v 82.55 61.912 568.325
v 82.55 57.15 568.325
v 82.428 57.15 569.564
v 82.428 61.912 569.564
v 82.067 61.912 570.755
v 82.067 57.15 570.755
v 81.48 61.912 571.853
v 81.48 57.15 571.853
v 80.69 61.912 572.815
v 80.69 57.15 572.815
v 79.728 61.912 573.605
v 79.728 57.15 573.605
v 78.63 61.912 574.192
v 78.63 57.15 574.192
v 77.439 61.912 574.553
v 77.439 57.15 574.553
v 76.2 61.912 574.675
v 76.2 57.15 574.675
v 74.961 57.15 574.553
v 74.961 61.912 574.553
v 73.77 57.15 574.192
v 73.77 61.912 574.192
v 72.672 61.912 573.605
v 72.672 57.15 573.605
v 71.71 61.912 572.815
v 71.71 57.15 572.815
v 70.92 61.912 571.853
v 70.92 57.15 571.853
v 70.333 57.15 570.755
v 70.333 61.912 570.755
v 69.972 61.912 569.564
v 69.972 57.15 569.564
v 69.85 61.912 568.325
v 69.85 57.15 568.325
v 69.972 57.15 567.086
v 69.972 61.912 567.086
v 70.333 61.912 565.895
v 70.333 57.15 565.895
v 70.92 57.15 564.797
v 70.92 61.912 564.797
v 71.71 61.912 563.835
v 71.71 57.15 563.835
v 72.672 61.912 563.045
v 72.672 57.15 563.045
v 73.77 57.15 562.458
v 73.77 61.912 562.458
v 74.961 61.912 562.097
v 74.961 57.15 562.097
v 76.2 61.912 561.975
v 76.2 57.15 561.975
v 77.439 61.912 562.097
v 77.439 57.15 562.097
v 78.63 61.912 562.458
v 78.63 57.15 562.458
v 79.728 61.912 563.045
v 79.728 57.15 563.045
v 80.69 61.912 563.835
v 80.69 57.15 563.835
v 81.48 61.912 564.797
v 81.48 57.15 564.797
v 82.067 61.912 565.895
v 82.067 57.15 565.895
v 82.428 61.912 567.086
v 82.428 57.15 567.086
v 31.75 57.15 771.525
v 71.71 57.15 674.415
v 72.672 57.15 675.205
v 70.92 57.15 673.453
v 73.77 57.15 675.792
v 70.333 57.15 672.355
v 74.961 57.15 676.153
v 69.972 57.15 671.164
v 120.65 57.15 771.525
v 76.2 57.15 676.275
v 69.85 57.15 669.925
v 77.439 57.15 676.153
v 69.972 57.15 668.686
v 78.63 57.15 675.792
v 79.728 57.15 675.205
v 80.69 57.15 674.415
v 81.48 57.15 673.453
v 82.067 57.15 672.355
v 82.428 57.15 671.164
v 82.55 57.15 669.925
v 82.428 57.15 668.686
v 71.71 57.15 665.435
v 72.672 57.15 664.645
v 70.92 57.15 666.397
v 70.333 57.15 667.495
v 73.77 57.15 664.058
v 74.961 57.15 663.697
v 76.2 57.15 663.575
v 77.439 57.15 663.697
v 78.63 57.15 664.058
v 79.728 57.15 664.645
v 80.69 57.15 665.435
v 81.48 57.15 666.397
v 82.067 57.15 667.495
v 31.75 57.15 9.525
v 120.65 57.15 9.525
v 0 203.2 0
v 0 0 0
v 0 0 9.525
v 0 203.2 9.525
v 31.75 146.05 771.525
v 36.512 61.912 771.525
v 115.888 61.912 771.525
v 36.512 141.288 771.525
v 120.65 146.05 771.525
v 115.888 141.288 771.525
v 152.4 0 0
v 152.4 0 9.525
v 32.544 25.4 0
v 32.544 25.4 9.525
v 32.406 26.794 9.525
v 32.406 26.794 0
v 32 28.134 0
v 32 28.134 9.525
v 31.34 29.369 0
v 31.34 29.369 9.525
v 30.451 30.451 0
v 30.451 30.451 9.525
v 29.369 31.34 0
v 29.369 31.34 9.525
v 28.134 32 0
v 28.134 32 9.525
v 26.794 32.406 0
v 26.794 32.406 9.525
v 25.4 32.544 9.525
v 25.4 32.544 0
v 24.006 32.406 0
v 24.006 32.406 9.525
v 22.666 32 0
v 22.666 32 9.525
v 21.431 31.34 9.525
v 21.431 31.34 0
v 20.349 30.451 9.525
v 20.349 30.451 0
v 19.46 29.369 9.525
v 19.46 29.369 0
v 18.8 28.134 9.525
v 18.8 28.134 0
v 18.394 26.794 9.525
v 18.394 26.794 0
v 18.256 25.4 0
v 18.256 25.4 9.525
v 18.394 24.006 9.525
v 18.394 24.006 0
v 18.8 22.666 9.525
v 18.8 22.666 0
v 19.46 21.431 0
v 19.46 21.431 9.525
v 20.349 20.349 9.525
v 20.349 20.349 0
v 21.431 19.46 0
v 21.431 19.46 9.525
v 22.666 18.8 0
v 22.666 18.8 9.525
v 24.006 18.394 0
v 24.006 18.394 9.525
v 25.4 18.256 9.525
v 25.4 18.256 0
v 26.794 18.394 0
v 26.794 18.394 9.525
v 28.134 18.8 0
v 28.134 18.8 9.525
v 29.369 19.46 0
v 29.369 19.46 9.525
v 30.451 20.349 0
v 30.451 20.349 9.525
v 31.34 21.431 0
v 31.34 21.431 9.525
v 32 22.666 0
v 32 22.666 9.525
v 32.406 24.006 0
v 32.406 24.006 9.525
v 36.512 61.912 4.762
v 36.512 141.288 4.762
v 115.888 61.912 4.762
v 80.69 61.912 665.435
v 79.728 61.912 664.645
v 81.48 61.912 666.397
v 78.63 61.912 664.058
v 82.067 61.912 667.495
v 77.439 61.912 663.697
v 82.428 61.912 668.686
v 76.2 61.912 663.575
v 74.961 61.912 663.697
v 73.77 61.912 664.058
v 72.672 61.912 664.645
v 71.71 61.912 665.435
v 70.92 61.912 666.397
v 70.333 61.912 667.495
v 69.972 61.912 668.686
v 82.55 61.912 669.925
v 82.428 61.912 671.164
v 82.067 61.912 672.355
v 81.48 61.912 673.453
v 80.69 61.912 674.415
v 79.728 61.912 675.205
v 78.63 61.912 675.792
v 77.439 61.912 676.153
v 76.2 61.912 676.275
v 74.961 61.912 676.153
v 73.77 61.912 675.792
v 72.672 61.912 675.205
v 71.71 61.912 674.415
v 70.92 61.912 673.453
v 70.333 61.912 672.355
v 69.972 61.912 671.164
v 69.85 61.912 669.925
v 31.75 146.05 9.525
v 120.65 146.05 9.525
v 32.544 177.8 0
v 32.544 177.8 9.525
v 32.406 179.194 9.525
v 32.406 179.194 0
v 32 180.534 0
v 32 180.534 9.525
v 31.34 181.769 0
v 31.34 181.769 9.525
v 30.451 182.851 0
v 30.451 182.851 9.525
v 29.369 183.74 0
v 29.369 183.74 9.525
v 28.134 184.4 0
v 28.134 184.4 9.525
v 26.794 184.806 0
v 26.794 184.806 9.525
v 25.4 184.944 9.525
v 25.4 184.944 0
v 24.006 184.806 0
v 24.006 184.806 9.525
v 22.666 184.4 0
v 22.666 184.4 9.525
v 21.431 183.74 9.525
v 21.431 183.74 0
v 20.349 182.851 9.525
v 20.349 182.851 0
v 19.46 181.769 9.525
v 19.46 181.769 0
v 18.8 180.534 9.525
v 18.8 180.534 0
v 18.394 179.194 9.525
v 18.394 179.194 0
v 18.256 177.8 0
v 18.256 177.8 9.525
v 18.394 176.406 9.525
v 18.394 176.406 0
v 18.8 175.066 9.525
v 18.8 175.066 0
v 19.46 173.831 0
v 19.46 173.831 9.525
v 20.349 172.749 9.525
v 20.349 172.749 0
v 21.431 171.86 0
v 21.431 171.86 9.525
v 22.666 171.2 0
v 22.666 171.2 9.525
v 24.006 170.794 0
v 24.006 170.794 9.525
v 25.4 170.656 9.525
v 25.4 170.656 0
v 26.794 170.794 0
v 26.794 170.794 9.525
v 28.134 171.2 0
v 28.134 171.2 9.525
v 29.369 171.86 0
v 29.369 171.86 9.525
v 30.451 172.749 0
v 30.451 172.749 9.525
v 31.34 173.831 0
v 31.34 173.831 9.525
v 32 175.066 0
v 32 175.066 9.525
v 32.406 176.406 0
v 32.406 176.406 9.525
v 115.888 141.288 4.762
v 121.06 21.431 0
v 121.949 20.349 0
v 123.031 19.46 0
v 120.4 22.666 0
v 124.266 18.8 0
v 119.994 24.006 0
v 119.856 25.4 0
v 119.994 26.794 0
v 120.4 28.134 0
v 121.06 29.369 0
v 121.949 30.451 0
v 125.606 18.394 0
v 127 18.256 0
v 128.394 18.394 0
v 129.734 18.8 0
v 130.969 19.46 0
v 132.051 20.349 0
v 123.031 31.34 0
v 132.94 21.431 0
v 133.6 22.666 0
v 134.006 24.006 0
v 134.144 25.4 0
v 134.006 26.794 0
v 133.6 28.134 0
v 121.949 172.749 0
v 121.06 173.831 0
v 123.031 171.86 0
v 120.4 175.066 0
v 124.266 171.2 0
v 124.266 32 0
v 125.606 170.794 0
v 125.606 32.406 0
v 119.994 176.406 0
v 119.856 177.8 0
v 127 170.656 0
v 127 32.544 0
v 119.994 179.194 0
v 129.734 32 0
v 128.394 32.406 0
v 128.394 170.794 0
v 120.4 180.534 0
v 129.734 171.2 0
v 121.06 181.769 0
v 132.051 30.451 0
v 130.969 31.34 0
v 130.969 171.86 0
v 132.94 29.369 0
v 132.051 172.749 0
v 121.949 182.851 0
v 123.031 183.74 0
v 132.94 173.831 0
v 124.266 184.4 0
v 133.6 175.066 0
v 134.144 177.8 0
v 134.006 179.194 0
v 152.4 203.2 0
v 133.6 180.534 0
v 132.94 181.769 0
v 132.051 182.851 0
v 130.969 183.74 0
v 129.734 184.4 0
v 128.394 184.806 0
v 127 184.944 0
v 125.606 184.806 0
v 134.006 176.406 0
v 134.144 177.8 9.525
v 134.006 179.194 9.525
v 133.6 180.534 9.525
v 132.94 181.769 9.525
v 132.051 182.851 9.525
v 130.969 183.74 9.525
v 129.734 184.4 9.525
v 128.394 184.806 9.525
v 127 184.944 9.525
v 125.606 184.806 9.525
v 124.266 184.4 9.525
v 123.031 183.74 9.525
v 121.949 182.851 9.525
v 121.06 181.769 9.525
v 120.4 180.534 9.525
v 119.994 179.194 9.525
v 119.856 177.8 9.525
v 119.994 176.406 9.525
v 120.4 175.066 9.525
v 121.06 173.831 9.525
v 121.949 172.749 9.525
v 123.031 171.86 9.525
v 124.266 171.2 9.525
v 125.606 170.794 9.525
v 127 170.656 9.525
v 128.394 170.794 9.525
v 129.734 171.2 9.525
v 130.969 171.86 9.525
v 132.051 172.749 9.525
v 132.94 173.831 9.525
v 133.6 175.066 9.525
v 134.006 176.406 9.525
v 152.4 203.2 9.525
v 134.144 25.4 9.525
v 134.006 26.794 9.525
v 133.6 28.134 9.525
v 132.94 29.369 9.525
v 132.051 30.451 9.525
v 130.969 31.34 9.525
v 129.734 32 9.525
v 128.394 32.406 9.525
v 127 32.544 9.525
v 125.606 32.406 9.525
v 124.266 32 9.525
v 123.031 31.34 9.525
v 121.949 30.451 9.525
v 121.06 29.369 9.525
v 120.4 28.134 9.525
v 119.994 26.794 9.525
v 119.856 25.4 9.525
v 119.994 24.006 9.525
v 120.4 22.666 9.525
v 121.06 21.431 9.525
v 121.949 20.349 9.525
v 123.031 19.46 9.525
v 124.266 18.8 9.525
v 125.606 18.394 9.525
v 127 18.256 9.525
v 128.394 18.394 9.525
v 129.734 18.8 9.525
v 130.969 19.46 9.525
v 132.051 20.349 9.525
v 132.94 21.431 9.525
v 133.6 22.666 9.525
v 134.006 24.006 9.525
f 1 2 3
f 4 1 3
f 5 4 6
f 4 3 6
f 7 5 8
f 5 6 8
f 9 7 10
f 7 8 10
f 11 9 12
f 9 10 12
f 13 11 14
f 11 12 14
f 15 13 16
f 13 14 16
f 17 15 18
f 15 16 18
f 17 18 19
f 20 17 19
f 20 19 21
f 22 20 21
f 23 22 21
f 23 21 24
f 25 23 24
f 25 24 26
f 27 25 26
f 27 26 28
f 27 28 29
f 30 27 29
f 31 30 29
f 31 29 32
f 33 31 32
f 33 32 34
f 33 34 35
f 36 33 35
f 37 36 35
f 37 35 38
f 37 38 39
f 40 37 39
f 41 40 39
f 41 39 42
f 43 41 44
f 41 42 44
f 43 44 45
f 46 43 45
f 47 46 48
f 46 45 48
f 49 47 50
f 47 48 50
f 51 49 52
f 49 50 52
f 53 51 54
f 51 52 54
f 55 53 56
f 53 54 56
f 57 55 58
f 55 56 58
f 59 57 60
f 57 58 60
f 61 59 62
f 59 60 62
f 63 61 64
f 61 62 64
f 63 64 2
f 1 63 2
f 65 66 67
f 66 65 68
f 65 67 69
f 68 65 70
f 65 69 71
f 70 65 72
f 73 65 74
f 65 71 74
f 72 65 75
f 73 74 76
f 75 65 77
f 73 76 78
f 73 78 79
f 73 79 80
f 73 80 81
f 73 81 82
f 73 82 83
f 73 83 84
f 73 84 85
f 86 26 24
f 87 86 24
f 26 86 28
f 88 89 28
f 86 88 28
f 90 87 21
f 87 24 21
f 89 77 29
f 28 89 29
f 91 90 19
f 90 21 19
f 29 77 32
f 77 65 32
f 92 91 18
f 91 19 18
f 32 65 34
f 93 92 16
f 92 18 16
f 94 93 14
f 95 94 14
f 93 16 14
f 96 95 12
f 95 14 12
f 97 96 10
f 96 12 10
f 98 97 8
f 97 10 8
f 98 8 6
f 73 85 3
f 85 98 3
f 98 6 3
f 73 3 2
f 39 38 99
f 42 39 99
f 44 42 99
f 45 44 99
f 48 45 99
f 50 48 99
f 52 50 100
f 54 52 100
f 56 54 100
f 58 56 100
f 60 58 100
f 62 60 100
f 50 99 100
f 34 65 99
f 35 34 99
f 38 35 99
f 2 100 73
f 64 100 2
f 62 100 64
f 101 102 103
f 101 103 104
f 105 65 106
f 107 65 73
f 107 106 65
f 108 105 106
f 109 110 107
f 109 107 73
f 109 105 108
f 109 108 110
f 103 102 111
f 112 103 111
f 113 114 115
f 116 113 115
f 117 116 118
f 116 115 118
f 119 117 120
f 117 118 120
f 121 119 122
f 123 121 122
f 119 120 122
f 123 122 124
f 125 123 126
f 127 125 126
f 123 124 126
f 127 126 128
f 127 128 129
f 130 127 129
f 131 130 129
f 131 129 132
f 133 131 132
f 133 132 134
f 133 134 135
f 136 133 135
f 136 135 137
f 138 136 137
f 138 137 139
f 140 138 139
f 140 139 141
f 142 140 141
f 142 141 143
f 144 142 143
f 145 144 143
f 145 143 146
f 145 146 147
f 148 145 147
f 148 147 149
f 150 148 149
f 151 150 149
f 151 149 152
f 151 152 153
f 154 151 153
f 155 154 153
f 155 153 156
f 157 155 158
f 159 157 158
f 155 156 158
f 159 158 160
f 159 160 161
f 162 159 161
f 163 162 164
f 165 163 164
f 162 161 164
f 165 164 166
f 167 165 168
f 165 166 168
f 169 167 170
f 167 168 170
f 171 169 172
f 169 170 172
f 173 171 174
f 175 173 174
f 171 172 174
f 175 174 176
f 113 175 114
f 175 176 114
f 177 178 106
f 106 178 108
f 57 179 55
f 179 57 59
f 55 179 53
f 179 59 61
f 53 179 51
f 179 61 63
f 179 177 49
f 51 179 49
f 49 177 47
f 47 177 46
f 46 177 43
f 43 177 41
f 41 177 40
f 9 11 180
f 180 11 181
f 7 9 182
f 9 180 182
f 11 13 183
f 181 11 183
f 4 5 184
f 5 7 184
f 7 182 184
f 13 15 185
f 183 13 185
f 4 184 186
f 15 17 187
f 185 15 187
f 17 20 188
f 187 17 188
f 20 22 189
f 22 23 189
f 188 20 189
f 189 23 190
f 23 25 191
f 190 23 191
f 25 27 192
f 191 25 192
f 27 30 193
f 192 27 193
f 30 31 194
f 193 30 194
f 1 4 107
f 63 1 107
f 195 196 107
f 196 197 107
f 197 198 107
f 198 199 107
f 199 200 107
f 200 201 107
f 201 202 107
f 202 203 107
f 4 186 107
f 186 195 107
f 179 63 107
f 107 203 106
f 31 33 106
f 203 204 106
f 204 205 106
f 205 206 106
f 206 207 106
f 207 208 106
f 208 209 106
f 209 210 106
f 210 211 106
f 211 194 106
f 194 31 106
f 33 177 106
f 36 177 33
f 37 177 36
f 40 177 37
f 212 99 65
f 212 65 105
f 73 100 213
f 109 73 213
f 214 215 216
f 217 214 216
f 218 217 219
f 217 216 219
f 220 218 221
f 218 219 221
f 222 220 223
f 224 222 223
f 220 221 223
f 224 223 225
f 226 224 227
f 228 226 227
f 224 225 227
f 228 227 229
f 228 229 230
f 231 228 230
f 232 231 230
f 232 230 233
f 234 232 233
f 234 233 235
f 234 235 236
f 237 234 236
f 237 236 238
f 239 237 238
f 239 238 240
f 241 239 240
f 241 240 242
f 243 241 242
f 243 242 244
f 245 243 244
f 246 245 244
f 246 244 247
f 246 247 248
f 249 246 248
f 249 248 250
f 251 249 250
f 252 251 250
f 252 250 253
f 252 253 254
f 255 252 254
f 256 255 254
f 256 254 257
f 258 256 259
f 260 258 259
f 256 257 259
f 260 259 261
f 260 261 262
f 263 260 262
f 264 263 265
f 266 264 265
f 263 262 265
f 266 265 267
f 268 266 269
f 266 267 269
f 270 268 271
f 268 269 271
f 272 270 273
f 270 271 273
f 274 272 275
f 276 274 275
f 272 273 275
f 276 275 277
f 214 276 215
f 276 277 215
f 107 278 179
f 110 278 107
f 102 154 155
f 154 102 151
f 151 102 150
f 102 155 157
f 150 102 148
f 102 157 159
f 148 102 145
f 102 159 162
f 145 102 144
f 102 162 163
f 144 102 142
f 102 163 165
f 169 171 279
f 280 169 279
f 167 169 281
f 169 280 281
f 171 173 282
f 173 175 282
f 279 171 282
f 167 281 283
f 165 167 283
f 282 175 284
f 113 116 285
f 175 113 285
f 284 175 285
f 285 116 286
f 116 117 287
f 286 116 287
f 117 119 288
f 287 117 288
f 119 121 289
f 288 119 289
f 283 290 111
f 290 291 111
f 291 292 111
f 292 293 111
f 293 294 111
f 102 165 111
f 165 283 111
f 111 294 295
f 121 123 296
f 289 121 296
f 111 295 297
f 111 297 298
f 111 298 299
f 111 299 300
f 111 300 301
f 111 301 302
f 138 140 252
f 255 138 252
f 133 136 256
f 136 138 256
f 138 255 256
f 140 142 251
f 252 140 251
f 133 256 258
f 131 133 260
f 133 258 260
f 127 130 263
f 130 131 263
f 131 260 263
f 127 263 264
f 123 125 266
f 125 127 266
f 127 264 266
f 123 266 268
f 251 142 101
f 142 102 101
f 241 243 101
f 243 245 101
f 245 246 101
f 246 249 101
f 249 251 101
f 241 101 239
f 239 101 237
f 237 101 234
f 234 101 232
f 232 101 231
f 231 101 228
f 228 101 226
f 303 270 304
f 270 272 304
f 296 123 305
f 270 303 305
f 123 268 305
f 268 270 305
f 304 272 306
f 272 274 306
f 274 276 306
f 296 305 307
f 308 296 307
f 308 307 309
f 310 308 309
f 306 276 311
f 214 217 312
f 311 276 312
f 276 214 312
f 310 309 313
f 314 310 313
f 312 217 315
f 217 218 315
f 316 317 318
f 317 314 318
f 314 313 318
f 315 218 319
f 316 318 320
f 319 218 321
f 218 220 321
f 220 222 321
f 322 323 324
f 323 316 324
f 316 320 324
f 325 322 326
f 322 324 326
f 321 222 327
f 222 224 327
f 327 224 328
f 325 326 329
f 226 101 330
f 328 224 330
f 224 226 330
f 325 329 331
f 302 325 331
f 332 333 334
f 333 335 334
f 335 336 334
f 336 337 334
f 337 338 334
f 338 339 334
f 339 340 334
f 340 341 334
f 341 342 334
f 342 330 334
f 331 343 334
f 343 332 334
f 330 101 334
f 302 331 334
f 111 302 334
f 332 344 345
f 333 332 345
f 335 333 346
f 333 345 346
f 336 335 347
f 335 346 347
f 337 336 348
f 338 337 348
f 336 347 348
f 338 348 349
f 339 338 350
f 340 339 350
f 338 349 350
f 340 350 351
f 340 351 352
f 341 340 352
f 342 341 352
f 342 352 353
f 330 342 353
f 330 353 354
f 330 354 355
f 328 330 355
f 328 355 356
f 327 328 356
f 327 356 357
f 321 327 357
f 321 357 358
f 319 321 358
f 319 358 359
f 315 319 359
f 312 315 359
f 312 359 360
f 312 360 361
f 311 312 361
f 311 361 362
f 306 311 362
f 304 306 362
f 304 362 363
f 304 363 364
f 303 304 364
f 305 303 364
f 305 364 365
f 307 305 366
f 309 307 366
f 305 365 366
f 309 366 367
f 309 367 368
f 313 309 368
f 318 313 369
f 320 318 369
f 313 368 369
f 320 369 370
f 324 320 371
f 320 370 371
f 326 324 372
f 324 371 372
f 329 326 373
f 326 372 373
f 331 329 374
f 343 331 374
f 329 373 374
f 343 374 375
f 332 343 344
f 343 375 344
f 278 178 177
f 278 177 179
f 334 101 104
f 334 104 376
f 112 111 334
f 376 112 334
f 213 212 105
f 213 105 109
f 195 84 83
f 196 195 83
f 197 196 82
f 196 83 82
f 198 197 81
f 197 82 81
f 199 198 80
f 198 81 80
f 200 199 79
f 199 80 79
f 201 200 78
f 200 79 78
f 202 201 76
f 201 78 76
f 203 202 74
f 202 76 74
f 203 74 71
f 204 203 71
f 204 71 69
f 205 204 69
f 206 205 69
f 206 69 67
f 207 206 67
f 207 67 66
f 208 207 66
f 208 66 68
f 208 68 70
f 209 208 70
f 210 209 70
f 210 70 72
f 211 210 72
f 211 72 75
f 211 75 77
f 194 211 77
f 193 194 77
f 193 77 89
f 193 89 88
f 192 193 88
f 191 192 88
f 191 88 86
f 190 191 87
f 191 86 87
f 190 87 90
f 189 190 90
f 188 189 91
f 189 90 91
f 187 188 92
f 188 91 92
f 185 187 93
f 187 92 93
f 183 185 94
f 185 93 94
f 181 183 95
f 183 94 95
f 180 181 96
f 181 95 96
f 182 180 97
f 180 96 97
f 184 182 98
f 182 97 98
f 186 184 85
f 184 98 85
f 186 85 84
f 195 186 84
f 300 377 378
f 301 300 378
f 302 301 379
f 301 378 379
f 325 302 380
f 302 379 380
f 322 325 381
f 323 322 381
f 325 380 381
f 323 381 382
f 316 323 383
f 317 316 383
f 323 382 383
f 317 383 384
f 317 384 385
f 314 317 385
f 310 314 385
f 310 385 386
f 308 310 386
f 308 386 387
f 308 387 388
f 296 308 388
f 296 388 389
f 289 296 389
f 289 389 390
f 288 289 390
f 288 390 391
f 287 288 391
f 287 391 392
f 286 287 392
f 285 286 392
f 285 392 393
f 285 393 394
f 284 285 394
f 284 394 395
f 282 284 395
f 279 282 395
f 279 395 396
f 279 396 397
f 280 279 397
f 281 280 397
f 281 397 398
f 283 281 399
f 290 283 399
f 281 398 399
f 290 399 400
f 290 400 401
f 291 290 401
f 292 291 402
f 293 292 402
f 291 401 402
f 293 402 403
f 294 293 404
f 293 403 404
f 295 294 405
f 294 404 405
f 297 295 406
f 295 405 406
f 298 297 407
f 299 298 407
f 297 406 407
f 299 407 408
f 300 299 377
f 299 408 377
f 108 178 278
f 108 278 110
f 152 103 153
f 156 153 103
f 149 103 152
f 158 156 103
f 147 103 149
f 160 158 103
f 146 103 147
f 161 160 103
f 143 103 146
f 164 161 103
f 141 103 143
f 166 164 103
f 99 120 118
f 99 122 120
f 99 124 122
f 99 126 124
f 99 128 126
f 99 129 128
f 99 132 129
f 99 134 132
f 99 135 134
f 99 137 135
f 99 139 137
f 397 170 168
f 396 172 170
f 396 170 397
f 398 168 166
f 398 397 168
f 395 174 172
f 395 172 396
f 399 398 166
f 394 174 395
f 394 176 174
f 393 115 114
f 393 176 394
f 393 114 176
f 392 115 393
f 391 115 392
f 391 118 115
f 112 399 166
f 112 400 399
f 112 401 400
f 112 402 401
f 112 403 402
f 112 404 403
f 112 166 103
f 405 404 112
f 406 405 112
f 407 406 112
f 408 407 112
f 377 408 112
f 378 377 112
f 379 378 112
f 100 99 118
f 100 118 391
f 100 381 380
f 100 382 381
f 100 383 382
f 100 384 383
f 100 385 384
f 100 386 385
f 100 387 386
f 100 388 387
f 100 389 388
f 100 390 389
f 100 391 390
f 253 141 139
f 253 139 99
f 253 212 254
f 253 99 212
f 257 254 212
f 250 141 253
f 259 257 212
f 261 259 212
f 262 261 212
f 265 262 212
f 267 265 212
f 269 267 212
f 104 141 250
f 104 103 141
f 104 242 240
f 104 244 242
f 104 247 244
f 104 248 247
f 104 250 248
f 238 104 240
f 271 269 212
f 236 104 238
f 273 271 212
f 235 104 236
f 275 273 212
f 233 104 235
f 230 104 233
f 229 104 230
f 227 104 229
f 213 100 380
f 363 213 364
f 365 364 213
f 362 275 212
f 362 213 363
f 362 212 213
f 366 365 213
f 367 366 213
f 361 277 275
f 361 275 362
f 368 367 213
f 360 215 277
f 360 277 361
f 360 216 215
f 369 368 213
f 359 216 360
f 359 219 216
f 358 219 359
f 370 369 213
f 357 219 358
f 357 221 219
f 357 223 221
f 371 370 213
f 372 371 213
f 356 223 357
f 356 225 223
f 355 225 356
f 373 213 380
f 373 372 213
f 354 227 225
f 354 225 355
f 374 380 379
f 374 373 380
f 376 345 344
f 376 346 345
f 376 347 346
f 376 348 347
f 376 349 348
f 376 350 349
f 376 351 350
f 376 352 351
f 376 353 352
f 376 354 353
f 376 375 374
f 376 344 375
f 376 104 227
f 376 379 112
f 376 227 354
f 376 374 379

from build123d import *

# Parameters (mm, degrees)
F0_W        = 152.4
F0_H        = 203.2
F1_DEPTH    = 9.525
F2_W        = 88.9
F2_H        = 88.9
F3_DEPTH    = 762
F4_R        = 7.14375
F5_DEPTH    = 25.4
F7_T        = 4.7625
F7_T3_DEPTH = 98.425
F7_T5_DEPTH = 98.425
F6_R        = 6.35
F8_DEPTH    = 25.4


# Not quite as in the source:
# - a shell that OpenCascade refuses in one call is made with other operations: the cavity is built on its own and cut out


with BuildPart() as f1:
    # F0 (on Top) → F1 (new body)
    with BuildSketch(Plane.XY):
        with Locations((76.2, 101.6)):
            Rectangle(F0_W, F0_H)
    extrude(amount=F1_DEPTH)

    # F2 (on face) → F3 (join)
    with BuildSketch(Plane.XY.offset(9.525)):
        with Locations((76.2, 101.6)):
            Rectangle(F2_W, F2_H)
    extrude(amount=F3_DEPTH)

    # F4 (on face) → F5 (cut)
    with BuildSketch(Plane.XY.offset(9.525)):
        with Locations((127, 177.8)):
            Circle(F4_R)
        with Locations((127, 25.4)):
            Circle(F4_R)
        with Locations((25.4, 25.4)):
            Circle(F4_R)
        with Locations((25.4, 177.8)):
            Circle(F4_R)
    extrude(amount=-F5_DEPTH, mode=Mode.SUBTRACT)

    # F7: shell of thickness 4.7625, made by hand


with BuildPart() as f7_core1:
    # F7_t2: copy of F1
    add(f1.part)

    # the walls: a layer under each face that stays
    f7_faces = [f7_core1.faces().sort_by_distance(p)[0] for p in [
        (0, 101.6, 4.7625),
        (76.2, 203.2, 4.7625),
        (76.2, 0, 4.7625),
        (76.2, 101.6, 0),
        (25.4, 33.8666666667, 9.525),
        (152.4, 101.6, 4.7625),
        (18.25625, 25.4, 4.7625),
        (119.85625, 25.4, 4.7625),
        (18.25625, 177.8, 4.7625),
        (119.85625, 177.8, 4.7625),
        (120.65, 101.6, 390.525),
        (76.2, 57.15, 390.525),
        (76.2, 146.05, 390.525),
        (31.75, 101.6, 390.525),
    ]]
    thicken(f7_faces, amount=-F7_T, mode=Mode.SUBTRACT)

    # F7_s4 → F7_t3 (cut)
    with BuildSketch(Plane.XZ.offset(-150.8125)):
        Polygon((120.697625, 9.572625), (120.65, 4.7625), (115.8875, 4.7625), (115.8875, 9.525), align=None)
        Polygon((31.702375, 9.572625), (31.75, 4.7625), (36.5125, 4.7625), (36.5125, 9.525), align=None)
    extrude(amount=F7_T3_DEPTH, mode=Mode.SUBTRACT)

    # F7_s6 → F7_t5 (cut)
    with BuildSketch(Plane.YZ.offset(26.9875)):
        Polygon((57.102375, 9.572625), (57.15, 4.7625), (61.9125, 4.7625), (61.9125, 9.525), align=None)
        Polygon((146.097625, 9.572625), (146.05, 4.7625), (141.2875, 4.7625), (141.2875, 9.525), align=None)
    extrude(amount=F7_T5_DEPTH, mode=Mode.SUBTRACT)


with BuildPart() as f1_1:
    add(f1.part)

    # what is left inside the walls is the cavity
    f7_cavity = [f7_core1.part.solids().sort_by_distance(p)[0] for p in [
        (36.560125, 88.370833, 388.14375),
    ]]
    add(f7_cavity, mode=Mode.SUBTRACT)

    # F6 (on face) → F8 (cut)
    with BuildSketch(Plane.XZ.offset(-57.15)):
        with Locations((76.2, 669.925)):
            Circle(F6_R)
        with Locations((76.2, 568.325)):
            Circle(F6_R)
    extrude(amount=-F8_DEPTH, mode=Mode.SUBTRACT)


solid = f1_1.part
